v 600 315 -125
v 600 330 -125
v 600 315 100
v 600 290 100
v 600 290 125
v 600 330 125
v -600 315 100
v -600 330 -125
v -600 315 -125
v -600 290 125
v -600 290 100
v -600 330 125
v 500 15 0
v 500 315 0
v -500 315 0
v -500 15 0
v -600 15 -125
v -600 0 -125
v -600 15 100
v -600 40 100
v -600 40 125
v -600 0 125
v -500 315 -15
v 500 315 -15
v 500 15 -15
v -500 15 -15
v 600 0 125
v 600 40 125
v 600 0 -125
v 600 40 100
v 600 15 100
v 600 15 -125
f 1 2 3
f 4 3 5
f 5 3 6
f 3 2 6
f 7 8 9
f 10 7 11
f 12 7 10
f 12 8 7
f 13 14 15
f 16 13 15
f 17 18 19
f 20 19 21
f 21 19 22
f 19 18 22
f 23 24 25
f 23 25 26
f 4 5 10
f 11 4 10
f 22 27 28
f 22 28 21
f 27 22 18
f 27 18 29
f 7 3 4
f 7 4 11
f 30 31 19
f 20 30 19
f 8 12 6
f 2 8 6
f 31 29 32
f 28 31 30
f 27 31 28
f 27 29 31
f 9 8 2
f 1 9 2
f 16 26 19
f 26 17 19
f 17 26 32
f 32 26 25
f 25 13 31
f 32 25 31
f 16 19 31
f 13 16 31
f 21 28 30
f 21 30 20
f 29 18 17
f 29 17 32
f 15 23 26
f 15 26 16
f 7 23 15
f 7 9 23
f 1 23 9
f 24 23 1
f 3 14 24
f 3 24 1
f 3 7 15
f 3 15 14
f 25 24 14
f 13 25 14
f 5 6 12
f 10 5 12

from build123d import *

# Parameters (mm, degrees)
F0_W     = 1200
F0_H     = 250
F1_DEPTH = 15
F2_W     = 1200
F2_H     = 25
F3_DEPTH = 25
F4_W     = 1000
F4_H     = 15
F5_DEPTH = 150


with BuildPart() as f1:
    # F0 (on Front) → F1 (new body)
    with BuildSketch(Plane.XZ):
        Rectangle(F0_W, F0_H)
    extrude(amount=-F1_DEPTH)

    # F2 (on face) → F3 (join)
    with BuildSketch(Plane(origin=(0, 15, 0), x_dir=(-1, 0, 0), z_dir=(0, 1, 0))):
        with Locations((0, 112.5)):
            Rectangle(F2_W, F2_H)
    extrude(amount=F3_DEPTH)

    # F4 (on face) → F5 (join)
    with BuildSketch(Plane(origin=(0, 15, 0), x_dir=(-1, 0, 0), z_dir=(0, 1, 0))):
        with Locations((0, -7.5)):
            Rectangle(F4_W, F4_H)
    extrude(amount=F5_DEPTH)

    # F6: F1 across face


with BuildPart() as f1_1:
    add(f1.part)
    add(f1.part.mirror(Plane(origin=(0, 165, -7.5), x_dir=(-1, 0, 0), z_dir=(0, 1, 0))))


solid = f1_1.part
